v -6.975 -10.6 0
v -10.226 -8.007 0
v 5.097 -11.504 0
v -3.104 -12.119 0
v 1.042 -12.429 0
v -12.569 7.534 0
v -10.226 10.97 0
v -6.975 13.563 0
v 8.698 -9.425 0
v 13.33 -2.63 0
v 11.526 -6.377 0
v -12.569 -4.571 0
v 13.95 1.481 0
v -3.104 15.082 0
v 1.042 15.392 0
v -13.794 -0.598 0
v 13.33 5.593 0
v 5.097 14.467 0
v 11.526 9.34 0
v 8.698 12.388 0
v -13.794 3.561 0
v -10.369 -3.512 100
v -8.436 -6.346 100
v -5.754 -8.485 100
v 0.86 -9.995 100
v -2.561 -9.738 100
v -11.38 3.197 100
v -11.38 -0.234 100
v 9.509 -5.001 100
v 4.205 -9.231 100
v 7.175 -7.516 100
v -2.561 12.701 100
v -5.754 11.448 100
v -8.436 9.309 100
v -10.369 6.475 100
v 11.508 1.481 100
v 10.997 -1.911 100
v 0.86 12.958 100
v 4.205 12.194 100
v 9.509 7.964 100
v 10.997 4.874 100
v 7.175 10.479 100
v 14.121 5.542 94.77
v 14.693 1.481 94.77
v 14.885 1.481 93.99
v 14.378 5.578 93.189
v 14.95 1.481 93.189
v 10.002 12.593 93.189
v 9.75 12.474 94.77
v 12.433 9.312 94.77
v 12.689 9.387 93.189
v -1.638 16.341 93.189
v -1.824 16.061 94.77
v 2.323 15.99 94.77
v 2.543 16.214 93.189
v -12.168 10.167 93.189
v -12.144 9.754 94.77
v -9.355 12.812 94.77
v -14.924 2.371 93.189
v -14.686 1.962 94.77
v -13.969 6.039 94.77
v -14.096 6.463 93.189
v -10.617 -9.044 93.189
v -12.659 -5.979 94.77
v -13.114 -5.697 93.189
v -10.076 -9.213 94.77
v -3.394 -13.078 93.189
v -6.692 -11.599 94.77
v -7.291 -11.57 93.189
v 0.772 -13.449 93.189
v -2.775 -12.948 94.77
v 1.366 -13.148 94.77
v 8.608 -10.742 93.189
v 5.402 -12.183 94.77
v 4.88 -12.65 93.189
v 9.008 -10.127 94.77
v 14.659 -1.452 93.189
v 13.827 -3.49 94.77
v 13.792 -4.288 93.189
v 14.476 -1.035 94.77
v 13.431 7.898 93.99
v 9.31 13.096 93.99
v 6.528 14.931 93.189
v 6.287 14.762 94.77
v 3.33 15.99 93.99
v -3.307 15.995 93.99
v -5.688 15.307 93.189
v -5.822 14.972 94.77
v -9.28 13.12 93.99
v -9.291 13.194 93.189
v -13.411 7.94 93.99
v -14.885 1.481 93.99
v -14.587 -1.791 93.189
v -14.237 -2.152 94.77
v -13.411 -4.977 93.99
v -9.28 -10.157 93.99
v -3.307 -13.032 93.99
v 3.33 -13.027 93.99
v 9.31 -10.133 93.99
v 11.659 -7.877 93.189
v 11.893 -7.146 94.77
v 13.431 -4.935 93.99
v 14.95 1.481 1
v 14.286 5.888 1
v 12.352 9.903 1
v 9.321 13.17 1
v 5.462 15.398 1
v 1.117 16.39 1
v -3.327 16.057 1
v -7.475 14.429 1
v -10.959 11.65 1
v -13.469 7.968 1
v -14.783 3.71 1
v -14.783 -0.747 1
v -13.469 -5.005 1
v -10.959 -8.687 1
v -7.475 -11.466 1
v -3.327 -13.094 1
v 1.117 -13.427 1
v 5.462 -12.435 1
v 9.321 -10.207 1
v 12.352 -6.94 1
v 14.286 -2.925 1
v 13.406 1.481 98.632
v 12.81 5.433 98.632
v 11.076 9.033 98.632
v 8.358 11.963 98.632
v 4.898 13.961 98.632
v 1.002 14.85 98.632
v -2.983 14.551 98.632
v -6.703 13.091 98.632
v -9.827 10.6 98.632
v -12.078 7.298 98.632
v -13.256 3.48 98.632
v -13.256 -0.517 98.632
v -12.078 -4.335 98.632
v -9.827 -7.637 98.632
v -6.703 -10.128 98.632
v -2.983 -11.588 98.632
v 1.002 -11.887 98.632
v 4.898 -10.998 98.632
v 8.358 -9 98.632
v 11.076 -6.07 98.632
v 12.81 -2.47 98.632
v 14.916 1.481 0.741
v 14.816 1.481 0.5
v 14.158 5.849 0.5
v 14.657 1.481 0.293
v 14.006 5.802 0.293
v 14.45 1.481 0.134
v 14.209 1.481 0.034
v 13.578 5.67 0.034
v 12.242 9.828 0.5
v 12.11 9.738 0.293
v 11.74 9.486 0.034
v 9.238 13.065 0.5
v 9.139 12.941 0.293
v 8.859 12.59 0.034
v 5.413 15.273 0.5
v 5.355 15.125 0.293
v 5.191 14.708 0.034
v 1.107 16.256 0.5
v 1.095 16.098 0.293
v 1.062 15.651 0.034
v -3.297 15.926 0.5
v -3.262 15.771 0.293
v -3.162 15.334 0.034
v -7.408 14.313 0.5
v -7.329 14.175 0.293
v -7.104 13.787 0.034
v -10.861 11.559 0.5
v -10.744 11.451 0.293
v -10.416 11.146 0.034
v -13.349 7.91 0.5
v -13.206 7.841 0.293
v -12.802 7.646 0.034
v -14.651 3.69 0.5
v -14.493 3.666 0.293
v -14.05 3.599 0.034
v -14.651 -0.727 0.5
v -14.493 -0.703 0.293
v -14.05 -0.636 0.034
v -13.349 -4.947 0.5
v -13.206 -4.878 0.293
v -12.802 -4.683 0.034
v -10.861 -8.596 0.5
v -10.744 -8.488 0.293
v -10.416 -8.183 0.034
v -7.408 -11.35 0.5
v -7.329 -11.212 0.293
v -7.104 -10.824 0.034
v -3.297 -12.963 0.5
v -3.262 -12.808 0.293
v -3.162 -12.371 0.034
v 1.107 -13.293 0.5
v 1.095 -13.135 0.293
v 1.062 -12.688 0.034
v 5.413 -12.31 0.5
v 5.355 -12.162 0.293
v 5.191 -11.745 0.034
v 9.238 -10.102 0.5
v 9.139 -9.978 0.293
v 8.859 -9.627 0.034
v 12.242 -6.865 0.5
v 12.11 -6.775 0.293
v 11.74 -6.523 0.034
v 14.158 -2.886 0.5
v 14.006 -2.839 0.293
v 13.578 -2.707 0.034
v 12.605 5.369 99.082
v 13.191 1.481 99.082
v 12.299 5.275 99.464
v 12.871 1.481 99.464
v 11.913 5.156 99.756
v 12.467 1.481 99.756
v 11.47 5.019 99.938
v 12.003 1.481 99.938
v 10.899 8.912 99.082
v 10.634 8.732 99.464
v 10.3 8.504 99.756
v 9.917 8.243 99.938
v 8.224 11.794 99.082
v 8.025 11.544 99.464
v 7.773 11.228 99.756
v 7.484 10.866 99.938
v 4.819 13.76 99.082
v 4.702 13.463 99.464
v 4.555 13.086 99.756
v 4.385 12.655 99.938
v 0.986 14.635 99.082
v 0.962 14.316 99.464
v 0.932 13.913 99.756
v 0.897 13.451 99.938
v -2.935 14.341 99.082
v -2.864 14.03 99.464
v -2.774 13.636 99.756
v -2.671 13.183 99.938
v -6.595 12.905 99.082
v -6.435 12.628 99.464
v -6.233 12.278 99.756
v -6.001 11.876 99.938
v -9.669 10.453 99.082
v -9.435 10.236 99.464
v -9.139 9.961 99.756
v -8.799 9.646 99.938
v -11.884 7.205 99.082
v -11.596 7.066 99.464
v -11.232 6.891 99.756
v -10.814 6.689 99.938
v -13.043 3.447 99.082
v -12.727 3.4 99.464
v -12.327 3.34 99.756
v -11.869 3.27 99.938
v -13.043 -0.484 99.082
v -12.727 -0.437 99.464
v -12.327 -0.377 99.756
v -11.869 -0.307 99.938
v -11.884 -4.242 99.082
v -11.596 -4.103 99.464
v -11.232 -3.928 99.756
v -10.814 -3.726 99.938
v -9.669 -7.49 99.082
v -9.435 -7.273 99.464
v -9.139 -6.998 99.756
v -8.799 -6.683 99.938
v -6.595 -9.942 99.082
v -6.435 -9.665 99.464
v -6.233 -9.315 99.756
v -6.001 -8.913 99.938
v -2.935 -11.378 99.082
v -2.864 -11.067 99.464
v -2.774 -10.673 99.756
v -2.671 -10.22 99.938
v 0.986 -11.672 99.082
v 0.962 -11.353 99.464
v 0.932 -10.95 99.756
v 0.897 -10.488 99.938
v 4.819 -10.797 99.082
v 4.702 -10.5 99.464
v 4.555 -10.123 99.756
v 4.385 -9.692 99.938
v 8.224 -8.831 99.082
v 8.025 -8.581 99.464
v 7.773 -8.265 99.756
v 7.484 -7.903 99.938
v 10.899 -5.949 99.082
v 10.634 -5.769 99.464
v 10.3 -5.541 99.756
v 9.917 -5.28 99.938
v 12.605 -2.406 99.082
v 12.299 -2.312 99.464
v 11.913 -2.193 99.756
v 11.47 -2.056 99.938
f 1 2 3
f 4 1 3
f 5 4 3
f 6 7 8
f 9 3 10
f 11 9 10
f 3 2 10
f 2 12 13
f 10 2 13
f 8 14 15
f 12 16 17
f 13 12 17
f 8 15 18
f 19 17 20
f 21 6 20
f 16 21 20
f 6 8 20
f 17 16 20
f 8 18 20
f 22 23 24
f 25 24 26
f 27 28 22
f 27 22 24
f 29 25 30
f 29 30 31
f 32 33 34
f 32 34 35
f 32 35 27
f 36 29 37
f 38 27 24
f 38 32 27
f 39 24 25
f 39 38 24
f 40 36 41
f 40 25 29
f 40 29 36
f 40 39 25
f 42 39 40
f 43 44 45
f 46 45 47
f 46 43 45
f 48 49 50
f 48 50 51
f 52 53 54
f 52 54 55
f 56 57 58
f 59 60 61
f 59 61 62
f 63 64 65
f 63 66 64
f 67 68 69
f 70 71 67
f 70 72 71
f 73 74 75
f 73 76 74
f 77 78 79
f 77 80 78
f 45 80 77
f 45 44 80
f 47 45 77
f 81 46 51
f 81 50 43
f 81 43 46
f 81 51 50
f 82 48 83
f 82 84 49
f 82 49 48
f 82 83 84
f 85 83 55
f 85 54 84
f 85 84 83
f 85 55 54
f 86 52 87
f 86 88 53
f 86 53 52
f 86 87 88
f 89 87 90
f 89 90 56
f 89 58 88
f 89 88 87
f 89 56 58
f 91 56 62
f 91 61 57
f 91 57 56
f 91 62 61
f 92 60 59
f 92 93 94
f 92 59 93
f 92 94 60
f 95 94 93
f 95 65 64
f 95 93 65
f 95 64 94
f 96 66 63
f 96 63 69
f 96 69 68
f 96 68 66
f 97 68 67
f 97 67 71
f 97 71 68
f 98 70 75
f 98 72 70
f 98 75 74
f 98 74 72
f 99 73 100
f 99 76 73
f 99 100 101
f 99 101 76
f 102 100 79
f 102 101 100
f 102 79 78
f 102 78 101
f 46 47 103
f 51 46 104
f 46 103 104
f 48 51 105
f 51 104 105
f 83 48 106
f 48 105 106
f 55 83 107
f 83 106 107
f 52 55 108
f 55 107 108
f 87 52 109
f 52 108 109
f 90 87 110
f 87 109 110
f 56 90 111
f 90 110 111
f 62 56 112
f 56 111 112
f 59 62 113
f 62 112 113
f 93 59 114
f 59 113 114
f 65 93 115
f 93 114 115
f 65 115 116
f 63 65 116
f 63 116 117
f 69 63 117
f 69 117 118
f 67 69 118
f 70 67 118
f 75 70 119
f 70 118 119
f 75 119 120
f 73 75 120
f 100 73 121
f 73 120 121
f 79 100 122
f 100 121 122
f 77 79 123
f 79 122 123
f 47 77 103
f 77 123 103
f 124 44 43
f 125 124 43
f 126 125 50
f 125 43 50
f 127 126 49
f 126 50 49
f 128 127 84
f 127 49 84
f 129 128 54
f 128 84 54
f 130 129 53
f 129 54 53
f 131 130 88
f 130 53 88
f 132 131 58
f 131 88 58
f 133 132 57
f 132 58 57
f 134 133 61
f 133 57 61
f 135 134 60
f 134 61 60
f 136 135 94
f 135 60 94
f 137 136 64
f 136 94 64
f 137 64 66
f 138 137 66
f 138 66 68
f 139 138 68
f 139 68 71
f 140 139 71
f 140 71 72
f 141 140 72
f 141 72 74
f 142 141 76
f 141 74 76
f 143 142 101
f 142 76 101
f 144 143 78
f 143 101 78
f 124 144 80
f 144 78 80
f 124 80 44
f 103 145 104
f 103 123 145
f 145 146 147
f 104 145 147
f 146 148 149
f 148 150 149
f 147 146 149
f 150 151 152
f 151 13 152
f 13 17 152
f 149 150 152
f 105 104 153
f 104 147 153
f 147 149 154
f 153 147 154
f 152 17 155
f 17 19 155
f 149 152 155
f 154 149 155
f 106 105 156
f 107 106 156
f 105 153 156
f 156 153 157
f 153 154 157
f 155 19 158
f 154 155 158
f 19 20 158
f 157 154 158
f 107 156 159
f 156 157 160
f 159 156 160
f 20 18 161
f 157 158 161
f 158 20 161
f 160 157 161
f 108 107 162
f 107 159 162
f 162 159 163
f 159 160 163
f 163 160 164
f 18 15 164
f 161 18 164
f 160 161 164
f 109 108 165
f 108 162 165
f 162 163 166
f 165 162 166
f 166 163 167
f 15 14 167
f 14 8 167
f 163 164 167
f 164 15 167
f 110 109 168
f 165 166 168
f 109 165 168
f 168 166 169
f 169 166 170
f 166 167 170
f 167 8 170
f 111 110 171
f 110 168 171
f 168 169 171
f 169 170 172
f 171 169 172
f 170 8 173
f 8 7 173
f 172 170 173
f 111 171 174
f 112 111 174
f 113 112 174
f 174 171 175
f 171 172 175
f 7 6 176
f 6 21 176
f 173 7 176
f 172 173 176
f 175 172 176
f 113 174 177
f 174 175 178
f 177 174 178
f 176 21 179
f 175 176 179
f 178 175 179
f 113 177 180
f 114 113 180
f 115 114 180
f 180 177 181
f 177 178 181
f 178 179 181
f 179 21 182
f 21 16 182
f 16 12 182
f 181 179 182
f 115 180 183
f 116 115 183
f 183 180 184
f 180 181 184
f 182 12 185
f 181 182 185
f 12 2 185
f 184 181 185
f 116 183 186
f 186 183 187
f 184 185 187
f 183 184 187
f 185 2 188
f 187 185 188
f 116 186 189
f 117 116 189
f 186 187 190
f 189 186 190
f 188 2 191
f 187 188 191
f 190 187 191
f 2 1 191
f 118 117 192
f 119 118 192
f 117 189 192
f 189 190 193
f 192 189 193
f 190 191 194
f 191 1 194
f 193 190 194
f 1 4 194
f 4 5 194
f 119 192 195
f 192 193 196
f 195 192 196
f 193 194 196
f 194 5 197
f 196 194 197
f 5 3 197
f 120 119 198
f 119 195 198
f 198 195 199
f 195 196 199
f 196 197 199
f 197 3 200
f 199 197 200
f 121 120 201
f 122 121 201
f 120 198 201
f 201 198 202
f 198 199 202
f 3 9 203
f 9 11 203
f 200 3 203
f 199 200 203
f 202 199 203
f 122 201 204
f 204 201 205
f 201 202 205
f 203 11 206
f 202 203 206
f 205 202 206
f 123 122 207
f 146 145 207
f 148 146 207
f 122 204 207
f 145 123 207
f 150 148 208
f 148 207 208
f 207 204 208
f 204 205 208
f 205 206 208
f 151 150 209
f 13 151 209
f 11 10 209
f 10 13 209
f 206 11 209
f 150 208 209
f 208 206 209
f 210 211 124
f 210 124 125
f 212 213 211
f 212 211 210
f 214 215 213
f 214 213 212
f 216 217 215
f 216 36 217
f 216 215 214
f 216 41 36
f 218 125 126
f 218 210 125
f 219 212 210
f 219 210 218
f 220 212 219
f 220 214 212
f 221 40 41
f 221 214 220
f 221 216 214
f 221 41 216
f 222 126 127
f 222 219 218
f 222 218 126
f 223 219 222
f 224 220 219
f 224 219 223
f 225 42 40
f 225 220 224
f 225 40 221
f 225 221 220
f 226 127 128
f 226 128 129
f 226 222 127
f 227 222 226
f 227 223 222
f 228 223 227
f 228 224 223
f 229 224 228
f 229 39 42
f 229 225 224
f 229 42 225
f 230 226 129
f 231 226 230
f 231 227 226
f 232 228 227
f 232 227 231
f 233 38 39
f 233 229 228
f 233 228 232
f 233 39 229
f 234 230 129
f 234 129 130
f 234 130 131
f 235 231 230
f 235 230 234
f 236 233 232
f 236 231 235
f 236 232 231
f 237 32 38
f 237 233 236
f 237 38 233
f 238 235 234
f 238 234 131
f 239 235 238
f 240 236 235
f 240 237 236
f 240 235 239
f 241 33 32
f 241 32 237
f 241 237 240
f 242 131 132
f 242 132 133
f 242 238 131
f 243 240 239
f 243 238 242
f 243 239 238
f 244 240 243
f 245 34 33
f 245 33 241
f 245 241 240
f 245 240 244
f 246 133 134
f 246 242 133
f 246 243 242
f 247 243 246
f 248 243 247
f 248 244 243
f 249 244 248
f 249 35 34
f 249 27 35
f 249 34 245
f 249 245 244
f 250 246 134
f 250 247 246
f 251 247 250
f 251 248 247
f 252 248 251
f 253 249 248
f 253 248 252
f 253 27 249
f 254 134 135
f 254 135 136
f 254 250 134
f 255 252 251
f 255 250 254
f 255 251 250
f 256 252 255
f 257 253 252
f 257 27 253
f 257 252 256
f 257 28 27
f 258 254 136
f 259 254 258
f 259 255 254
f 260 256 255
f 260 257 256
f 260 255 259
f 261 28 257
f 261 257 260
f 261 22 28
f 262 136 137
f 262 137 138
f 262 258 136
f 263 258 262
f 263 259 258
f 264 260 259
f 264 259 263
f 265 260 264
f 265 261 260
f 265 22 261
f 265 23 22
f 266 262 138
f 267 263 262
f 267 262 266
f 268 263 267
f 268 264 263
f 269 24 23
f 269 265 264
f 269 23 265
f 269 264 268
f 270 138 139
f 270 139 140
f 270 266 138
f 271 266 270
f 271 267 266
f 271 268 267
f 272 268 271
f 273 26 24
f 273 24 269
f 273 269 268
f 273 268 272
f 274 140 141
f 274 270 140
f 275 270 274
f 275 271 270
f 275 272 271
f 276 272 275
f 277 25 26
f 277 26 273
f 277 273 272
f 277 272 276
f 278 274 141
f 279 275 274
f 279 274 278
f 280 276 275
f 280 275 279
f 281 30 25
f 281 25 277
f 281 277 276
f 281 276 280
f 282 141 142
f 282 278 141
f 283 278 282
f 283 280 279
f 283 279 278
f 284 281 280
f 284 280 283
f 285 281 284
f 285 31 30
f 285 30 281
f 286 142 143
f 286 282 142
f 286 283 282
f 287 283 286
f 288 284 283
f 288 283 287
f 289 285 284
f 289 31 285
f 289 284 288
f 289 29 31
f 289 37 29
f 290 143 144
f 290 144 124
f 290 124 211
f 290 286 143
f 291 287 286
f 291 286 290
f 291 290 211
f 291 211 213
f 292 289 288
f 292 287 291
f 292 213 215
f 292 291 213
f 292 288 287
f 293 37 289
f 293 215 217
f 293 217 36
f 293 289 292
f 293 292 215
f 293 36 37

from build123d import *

# Parameters (mm, degrees)
F0_R     = 14.95
F1_DEPTH = 100
F2_SIZE2 = 6
F2_SIZE  = 2
F3_R     = 1
F4_R     = 2
F5_R     = 5


with BuildPart() as f1:
    # F0 (on Top) → F1 (new body)
    with BuildSketch(Plane.XY):
        with Locations((0, 1.4814995229)):
            Circle(F0_R)
    extrude(amount=F1_DEPTH)

    # F2
    f2_edges = [f1.edges().sort_by_distance(p)[0] for p in [
        (-14.95, 1.4815, 100),
    ]]
    f2_side = f1.faces().sort_by_distance((0, 1.4815, 100))[0]
    chamfer(f2_edges, length=F2_SIZE, length2=F2_SIZE2, reference=f2_side)

    # F3
    f3_edges = [f1.edges().sort_by_distance(p)[0] for p in [
        (-14.95, 1.4815, 0),
    ]]
    fillet(f3_edges, radius=F3_R)

    # F4
    f4_edges = [f1.edges().sort_by_distance(p)[0] for p in [
        (-12.95, 1.4815, 100),
    ]]
    fillet(f4_edges, radius=F4_R)

    # F5
    f5_edges = [f1.edges().sort_by_distance(p)[0] for p in [
        (-14.95, 1.4815, 94),
    ]]
    fillet(f5_edges, radius=F5_R)


solid = f1.part
